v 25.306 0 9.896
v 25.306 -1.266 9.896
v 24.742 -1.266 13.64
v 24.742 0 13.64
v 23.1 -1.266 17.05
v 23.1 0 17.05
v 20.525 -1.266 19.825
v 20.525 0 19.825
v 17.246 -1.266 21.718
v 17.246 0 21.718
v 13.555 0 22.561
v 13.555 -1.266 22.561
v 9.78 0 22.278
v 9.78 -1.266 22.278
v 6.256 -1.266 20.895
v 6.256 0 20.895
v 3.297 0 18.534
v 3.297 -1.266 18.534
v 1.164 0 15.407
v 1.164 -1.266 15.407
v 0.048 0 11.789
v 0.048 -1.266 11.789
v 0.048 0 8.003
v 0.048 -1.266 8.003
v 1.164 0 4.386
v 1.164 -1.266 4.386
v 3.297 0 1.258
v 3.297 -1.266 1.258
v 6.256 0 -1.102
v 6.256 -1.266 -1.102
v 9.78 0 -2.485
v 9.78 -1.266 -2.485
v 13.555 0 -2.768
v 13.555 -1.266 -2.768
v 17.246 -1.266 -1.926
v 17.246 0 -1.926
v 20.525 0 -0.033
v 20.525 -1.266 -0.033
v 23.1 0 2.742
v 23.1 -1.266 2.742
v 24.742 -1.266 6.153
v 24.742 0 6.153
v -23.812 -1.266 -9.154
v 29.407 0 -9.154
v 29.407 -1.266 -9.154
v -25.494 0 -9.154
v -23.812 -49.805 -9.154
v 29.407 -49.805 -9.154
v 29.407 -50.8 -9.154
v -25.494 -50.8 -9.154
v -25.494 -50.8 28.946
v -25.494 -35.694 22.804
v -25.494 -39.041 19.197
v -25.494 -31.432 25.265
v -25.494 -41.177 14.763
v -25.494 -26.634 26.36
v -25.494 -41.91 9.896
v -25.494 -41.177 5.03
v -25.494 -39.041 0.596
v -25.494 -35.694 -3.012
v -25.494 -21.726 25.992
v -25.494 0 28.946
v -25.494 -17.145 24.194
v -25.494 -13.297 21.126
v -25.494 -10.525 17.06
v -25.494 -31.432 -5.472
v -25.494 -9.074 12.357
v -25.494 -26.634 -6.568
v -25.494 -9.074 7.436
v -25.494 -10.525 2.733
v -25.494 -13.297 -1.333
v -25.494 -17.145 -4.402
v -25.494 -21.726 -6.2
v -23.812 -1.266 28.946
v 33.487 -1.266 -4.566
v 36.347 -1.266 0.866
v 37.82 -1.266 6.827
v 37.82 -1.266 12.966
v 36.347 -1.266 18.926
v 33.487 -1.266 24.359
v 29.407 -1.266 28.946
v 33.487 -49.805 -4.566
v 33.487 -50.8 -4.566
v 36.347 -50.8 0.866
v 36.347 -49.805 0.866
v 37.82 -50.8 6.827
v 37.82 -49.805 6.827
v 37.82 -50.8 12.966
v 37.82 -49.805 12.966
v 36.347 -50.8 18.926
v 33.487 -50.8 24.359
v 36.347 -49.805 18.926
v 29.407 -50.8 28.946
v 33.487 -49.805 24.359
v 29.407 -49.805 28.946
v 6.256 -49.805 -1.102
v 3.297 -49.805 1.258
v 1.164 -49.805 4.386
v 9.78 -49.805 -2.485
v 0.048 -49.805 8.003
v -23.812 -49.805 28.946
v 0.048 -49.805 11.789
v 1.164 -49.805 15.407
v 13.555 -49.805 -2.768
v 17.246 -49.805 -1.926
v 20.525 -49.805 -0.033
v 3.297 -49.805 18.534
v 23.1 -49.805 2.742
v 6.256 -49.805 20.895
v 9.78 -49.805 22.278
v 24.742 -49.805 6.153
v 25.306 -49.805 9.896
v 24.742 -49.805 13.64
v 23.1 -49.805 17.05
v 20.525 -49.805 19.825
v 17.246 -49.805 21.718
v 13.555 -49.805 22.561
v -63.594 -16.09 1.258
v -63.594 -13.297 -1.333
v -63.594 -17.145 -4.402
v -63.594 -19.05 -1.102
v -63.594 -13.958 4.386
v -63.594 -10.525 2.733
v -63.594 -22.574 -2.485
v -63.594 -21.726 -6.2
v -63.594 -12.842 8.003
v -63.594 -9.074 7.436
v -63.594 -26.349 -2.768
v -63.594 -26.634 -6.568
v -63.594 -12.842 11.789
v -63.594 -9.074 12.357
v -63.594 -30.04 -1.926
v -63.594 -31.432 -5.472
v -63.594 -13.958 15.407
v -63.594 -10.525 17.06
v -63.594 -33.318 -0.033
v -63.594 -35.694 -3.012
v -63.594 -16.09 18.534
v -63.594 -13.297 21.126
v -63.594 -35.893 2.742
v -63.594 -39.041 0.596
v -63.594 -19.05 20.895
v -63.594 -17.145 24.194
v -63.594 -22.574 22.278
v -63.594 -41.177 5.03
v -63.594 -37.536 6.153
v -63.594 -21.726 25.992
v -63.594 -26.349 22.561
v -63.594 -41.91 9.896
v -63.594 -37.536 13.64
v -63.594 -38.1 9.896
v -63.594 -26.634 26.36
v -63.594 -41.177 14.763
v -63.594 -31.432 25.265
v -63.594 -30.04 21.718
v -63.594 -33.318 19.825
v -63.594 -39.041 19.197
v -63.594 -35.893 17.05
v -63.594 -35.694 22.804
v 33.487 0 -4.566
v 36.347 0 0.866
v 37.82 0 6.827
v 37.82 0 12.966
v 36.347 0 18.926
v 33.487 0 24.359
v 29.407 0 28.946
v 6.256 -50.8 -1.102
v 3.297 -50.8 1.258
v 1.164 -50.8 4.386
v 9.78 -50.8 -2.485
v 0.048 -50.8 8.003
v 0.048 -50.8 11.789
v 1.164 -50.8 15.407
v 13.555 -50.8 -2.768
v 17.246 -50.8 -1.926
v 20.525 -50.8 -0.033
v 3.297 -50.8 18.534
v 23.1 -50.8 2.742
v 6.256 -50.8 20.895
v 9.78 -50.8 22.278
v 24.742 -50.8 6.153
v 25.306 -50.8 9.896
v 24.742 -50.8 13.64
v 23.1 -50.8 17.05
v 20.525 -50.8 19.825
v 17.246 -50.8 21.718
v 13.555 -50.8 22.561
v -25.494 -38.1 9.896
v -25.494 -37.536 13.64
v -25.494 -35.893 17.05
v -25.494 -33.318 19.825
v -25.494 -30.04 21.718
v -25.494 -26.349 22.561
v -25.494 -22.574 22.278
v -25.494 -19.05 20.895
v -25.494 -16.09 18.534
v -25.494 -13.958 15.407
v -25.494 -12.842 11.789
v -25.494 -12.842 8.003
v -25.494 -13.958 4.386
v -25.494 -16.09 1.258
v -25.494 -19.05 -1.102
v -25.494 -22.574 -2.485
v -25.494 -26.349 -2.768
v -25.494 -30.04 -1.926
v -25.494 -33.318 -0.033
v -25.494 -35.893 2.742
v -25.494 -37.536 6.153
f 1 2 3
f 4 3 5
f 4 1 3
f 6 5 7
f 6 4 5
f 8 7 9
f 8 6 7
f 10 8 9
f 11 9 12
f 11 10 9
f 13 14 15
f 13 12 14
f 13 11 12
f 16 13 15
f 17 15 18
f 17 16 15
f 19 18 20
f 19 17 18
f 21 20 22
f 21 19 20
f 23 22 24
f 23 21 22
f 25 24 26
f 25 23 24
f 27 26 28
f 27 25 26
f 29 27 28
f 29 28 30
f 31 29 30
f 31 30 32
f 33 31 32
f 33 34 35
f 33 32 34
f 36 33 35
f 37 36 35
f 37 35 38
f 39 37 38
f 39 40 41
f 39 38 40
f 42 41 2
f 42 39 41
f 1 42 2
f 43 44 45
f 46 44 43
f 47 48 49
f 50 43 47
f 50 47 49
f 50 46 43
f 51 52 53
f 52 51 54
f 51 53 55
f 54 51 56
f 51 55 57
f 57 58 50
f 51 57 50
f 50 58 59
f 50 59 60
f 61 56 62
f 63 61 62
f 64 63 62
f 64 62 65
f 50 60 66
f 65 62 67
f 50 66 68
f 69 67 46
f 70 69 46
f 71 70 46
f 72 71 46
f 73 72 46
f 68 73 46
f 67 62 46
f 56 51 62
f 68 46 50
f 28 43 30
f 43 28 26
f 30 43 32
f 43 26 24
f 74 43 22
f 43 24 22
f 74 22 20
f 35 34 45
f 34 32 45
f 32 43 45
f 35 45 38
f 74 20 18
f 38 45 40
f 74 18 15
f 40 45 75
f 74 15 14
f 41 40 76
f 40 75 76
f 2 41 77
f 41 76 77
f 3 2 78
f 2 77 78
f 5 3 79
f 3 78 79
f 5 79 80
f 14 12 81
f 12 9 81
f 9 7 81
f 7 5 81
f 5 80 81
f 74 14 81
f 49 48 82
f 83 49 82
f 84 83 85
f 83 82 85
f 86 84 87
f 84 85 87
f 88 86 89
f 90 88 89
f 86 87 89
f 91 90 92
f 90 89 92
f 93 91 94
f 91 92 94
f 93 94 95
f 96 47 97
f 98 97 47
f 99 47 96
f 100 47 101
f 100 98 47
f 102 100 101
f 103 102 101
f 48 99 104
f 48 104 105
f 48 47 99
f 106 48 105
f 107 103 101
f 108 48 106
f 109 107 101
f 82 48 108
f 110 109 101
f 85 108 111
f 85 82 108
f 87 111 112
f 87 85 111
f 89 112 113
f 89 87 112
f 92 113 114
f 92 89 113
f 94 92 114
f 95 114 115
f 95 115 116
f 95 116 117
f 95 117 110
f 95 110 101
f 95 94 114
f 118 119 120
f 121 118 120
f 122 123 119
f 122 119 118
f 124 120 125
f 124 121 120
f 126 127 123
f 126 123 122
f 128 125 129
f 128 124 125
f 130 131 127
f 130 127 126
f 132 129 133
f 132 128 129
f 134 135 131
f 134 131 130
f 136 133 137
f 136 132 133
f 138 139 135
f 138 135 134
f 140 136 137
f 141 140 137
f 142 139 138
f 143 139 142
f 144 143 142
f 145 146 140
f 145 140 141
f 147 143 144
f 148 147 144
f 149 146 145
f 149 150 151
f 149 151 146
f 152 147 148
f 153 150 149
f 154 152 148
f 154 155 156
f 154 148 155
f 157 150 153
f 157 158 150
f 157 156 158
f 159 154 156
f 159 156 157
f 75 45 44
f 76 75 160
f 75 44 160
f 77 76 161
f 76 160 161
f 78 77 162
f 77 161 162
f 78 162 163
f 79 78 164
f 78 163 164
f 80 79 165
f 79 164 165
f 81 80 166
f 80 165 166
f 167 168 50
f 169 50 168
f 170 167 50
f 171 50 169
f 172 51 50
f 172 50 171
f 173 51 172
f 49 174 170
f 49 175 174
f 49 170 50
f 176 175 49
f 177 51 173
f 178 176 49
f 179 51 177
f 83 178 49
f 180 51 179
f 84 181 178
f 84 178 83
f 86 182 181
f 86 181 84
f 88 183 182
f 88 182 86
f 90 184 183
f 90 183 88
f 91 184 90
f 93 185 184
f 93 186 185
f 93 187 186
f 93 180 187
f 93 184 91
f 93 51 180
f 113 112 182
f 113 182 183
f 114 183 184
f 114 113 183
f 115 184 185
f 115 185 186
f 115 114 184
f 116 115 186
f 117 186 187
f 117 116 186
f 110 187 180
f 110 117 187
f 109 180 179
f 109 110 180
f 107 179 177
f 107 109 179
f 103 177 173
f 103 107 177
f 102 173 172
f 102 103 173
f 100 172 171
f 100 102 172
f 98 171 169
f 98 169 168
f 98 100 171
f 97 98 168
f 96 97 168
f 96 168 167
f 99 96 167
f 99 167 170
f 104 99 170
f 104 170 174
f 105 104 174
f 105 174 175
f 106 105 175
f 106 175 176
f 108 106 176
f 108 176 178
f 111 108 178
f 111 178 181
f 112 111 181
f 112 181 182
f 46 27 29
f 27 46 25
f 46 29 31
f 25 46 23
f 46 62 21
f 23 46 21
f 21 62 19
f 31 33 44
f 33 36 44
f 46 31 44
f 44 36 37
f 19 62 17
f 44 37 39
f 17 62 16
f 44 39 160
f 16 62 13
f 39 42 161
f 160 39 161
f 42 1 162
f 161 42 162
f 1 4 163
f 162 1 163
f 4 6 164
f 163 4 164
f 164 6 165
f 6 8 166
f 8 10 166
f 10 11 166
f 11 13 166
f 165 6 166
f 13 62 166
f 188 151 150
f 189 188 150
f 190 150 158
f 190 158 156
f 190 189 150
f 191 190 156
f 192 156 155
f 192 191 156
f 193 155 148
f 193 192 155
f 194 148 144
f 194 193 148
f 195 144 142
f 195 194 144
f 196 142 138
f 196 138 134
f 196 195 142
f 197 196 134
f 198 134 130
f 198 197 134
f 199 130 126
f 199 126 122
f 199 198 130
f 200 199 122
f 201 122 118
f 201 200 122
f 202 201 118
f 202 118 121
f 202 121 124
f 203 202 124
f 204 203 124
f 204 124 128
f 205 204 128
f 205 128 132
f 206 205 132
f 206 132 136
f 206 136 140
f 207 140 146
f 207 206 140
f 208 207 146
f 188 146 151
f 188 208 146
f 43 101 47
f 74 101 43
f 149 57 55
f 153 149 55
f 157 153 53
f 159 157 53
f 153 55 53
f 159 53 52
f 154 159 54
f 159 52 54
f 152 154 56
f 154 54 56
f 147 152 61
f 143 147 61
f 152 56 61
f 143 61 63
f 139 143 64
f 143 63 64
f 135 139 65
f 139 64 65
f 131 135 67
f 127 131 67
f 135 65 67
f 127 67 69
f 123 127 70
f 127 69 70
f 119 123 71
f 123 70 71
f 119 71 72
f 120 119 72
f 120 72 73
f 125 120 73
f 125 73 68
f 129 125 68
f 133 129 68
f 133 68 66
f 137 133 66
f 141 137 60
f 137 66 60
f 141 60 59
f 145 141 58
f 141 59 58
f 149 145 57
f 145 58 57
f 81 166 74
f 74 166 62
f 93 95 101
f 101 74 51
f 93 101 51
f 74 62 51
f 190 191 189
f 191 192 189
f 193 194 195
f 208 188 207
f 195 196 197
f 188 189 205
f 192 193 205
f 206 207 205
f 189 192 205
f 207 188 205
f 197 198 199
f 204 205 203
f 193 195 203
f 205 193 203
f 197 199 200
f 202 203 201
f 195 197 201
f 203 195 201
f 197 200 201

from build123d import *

# Parameters (mm, degrees)
F0_R     = 12.7
F1_DEPTH = 50.8
F2_W     = 48.538668
F2_H     = 54.82199
F3_DEPTH = 23.8125
F4_W     = 48.538668
F4_H     = 50.8
F5_DEPTH = 76.2
F6_R     = 16.51
F6_R_2   = 12.7
F7_DEPTH = 38.1
F8_W     = 50.8
F8_H     = 6.35
F9_DEPTH = 101.6


with BuildPart() as f1:
    # F0 (on Front) → F1 (new body)
    with BuildSketch(Plane.XZ):
        with BuildLine():
            Line((-25.493682, 35.296235), (-25.493682, -15.503765))
            Line((-25.493682, -15.503765), (12.606318, -15.503765))
            ThreePointArc((12.606318, -15.503765), (38.006318, 9.896235), (12.606318, 35.296235))
            Line((12.606318, 35.296235), (-25.493682, 35.296235))
        make_face()
        with Locations((12.606318, 9.896235)):
            Circle(F0_R, mode=Mode.SUBTRACT)
    extrude(amount=F1_DEPTH)

    # F2 (on Right) → F3 (cut, symmetric)
    with BuildSketch(Plane.YZ):
        with Locations((-25.535175, 9.630844)):
            Rectangle(F2_W, F2_H)
    extrude(amount=F3_DEPTH, both=True, mode=Mode.SUBTRACT)

    # F4 (on face) → F5 (cut)
    with BuildSketch(Plane.YZ.offset(-23.8125)):
        with Locations((-25.535175, 9.896235)):
            Rectangle(F4_W, F4_H)
    extrude(amount=F5_DEPTH, mode=Mode.SUBTRACT)

    # F6 (on face) → F7 (join)
    with BuildSketch(Plane(origin=(-25.493682, 0, 0), x_dir=(0, -1, 0), z_dir=(-1, 0, 0))):
        with Locations((25.4, 9.896235)):
            Circle(F6_R)
        with Locations((25.4, 9.896235)):
            Circle(F6_R_2, mode=Mode.SUBTRACT)
    extrude(amount=F7_DEPTH)

    # F8 (on face) → F9 (cut)
    with BuildSketch(Plane(origin=(-25.493682, 0, 0), x_dir=(0, -1, 0), z_dir=(-1, 0, 0))):
        with Locations((25.4, 32.121235)):
            Rectangle(F8_W, F8_H)
        with Locations((25.4, -12.328765)):
            Rectangle(F8_W, F8_H)
    extrude(amount=-F9_DEPTH, mode=Mode.SUBTRACT)


solid = f1.part
